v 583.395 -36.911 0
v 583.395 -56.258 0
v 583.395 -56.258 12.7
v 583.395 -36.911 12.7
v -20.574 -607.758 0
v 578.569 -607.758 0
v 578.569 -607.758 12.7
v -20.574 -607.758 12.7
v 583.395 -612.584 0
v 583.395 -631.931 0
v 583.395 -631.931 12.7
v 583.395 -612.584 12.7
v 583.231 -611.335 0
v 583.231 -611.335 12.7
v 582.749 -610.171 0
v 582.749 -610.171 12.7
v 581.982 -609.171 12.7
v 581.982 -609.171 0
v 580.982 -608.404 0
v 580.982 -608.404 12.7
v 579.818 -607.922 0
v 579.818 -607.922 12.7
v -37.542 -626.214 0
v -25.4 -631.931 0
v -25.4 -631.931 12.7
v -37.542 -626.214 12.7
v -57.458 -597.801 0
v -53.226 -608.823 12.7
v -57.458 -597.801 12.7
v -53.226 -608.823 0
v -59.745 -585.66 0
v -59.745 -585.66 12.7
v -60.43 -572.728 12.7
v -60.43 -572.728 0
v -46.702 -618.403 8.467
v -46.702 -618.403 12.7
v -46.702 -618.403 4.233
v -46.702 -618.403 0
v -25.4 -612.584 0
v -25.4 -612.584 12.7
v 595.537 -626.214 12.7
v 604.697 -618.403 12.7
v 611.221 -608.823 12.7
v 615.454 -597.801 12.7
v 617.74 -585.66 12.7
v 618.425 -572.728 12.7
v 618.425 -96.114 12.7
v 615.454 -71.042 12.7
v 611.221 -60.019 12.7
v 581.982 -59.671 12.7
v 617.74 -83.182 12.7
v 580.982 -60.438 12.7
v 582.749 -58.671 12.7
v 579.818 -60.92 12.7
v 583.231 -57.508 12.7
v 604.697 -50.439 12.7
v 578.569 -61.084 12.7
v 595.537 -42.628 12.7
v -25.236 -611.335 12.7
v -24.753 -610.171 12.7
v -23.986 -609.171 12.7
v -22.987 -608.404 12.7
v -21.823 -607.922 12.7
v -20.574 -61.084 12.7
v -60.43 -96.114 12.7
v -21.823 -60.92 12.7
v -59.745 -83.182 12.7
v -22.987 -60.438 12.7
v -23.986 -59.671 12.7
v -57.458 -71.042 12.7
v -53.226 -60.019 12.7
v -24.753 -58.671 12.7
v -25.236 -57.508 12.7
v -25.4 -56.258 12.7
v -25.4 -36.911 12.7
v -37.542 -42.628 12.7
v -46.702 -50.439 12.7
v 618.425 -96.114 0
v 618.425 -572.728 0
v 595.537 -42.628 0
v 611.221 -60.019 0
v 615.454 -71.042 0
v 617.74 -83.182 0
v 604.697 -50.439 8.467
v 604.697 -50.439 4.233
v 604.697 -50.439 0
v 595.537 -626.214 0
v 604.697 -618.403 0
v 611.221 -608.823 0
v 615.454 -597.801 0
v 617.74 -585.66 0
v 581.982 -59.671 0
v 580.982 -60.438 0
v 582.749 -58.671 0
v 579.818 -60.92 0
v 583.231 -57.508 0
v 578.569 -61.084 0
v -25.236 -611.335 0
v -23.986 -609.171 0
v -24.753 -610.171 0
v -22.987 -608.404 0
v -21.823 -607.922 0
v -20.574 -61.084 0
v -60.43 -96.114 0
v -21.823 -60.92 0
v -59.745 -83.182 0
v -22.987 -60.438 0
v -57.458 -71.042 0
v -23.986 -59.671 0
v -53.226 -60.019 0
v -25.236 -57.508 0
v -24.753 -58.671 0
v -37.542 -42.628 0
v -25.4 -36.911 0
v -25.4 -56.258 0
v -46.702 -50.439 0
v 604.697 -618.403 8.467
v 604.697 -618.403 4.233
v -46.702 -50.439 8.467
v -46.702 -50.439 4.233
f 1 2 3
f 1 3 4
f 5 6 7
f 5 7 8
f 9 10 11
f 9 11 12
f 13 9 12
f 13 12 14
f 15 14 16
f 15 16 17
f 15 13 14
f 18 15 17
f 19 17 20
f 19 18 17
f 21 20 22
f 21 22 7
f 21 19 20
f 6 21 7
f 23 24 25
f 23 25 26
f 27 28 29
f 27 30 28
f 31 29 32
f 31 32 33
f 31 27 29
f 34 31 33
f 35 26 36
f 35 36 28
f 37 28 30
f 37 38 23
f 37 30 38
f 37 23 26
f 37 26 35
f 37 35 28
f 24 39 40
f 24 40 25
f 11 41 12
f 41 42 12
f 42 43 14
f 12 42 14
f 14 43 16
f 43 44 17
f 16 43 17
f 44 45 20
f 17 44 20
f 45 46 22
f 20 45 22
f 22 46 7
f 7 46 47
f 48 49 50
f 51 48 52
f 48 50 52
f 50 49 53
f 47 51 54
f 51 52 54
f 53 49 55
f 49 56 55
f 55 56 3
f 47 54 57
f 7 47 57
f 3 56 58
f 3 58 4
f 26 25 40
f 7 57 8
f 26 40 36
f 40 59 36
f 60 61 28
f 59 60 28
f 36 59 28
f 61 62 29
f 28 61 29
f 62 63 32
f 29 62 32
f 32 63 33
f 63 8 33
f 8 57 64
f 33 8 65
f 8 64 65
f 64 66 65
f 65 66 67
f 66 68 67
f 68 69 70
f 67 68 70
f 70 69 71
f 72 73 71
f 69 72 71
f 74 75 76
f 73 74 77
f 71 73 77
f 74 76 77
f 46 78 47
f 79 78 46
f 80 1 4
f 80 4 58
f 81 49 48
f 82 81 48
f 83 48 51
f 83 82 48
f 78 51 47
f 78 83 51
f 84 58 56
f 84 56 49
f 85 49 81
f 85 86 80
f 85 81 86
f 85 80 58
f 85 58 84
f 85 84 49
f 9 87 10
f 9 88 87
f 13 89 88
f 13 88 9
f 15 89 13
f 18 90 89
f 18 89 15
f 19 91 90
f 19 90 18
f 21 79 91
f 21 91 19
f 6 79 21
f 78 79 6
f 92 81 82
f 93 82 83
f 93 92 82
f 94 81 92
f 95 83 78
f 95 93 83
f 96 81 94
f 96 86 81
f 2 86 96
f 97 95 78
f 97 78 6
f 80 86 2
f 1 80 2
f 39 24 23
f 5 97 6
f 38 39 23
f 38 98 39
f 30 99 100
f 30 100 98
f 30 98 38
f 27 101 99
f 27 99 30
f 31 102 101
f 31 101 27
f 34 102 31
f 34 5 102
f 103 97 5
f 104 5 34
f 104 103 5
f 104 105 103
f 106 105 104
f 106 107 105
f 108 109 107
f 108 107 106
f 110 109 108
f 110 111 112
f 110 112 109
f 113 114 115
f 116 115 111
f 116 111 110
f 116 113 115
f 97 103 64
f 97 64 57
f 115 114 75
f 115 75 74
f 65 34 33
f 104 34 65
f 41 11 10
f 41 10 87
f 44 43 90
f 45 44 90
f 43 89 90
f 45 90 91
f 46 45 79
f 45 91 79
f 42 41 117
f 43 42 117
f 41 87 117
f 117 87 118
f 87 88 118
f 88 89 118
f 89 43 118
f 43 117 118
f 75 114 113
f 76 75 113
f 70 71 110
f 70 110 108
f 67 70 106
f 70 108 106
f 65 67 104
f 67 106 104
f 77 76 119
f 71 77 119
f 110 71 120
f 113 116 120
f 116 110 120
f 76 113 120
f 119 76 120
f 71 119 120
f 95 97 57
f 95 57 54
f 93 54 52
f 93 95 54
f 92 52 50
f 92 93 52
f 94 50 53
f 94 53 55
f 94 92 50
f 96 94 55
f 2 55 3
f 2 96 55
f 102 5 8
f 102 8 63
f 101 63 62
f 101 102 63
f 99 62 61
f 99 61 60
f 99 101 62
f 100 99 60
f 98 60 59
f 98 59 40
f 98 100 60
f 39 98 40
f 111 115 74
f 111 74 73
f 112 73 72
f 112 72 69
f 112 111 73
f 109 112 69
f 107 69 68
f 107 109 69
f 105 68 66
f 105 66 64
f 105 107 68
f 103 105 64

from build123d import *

# Parameters (mm, degrees)
BOSS_EXTRUDE1_DEPTH = 12.7


with BuildPart() as part:
    # Sketch1 → Boss-Extrude1 (new body)
    with BuildSketch(Plane.XY):
        with BuildLine():
            Line((-20.574, -61.084457743), (578.569437198, -61.084457743))
            ThreePointArc((578.569437198, -61.084457743), (581.981934524, -59.670955069), (583.395437198, -56.258457743))
            Line((583.395437198, -56.258457743), (583.395437198, -36.911371471))
            add(Edge.make_bspline(
                [(583.395437198, -36.911371471), (610.890329995, -46.033932746), (618.425396158, -69.67439137), (618.425396158, -96.114416703)],
                knots=[0, 0, 0, 0, 1, 1, 1, 1], degree=3))
            Line((618.425396158, -96.114416703), (618.425396158, -572.727698858))
            add(Edge.make_bspline(
                [(583.395437198, -631.93074409), (610.890329995, -622.808182814), (618.425396158, -599.167724191), (618.425396158, -572.727698858)],
                knots=[0, 0, 0, 0, 1, 1, 1, 1], degree=3))
            Line((583.395437198, -631.93074409), (583.395437198, -612.583657817))
            ThreePointArc((583.395437198, -612.583657817), (581.981934524, -609.171160491), (578.569437198, -607.757657817))
            Line((578.569437198, -607.757657817), (-20.574, -607.757657817))
            ThreePointArc((-20.574, -607.757657817), (-23.986497326, -609.171160491), (-25.4, -612.583657817))
            Line((-25.4, -612.583657817), (-25.4, -631.93074409))
            add(Edge.make_bspline(
                [(-25.4, -631.93074409), (-52.894892797, -622.808182814), (-60.42995896, -599.167724191), (-60.42995896, -572.727698858)],
                knots=[0, 0, 0, 0, 1, 1, 1, 1], degree=3))
            Line((-60.42995896, -572.727698858), (-60.42995896, -96.114416703))
            add(Edge.make_bspline(
                [(-25.4, -36.911371471), (-52.894892797, -46.033932746), (-60.42995896, -69.67439137), (-60.42995896, -96.114416703)],
                knots=[0, 0, 0, 0, 1, 1, 1, 1], degree=3))
            Line((-25.4, -36.911371471), (-25.4, -56.258457743))
            ThreePointArc((-25.4, -56.258457743), (-23.986497326, -59.670955069), (-20.574, -61.084457743))
        make_face()
    extrude(amount=BOSS_EXTRUDE1_DEPTH)


solid = part.part
